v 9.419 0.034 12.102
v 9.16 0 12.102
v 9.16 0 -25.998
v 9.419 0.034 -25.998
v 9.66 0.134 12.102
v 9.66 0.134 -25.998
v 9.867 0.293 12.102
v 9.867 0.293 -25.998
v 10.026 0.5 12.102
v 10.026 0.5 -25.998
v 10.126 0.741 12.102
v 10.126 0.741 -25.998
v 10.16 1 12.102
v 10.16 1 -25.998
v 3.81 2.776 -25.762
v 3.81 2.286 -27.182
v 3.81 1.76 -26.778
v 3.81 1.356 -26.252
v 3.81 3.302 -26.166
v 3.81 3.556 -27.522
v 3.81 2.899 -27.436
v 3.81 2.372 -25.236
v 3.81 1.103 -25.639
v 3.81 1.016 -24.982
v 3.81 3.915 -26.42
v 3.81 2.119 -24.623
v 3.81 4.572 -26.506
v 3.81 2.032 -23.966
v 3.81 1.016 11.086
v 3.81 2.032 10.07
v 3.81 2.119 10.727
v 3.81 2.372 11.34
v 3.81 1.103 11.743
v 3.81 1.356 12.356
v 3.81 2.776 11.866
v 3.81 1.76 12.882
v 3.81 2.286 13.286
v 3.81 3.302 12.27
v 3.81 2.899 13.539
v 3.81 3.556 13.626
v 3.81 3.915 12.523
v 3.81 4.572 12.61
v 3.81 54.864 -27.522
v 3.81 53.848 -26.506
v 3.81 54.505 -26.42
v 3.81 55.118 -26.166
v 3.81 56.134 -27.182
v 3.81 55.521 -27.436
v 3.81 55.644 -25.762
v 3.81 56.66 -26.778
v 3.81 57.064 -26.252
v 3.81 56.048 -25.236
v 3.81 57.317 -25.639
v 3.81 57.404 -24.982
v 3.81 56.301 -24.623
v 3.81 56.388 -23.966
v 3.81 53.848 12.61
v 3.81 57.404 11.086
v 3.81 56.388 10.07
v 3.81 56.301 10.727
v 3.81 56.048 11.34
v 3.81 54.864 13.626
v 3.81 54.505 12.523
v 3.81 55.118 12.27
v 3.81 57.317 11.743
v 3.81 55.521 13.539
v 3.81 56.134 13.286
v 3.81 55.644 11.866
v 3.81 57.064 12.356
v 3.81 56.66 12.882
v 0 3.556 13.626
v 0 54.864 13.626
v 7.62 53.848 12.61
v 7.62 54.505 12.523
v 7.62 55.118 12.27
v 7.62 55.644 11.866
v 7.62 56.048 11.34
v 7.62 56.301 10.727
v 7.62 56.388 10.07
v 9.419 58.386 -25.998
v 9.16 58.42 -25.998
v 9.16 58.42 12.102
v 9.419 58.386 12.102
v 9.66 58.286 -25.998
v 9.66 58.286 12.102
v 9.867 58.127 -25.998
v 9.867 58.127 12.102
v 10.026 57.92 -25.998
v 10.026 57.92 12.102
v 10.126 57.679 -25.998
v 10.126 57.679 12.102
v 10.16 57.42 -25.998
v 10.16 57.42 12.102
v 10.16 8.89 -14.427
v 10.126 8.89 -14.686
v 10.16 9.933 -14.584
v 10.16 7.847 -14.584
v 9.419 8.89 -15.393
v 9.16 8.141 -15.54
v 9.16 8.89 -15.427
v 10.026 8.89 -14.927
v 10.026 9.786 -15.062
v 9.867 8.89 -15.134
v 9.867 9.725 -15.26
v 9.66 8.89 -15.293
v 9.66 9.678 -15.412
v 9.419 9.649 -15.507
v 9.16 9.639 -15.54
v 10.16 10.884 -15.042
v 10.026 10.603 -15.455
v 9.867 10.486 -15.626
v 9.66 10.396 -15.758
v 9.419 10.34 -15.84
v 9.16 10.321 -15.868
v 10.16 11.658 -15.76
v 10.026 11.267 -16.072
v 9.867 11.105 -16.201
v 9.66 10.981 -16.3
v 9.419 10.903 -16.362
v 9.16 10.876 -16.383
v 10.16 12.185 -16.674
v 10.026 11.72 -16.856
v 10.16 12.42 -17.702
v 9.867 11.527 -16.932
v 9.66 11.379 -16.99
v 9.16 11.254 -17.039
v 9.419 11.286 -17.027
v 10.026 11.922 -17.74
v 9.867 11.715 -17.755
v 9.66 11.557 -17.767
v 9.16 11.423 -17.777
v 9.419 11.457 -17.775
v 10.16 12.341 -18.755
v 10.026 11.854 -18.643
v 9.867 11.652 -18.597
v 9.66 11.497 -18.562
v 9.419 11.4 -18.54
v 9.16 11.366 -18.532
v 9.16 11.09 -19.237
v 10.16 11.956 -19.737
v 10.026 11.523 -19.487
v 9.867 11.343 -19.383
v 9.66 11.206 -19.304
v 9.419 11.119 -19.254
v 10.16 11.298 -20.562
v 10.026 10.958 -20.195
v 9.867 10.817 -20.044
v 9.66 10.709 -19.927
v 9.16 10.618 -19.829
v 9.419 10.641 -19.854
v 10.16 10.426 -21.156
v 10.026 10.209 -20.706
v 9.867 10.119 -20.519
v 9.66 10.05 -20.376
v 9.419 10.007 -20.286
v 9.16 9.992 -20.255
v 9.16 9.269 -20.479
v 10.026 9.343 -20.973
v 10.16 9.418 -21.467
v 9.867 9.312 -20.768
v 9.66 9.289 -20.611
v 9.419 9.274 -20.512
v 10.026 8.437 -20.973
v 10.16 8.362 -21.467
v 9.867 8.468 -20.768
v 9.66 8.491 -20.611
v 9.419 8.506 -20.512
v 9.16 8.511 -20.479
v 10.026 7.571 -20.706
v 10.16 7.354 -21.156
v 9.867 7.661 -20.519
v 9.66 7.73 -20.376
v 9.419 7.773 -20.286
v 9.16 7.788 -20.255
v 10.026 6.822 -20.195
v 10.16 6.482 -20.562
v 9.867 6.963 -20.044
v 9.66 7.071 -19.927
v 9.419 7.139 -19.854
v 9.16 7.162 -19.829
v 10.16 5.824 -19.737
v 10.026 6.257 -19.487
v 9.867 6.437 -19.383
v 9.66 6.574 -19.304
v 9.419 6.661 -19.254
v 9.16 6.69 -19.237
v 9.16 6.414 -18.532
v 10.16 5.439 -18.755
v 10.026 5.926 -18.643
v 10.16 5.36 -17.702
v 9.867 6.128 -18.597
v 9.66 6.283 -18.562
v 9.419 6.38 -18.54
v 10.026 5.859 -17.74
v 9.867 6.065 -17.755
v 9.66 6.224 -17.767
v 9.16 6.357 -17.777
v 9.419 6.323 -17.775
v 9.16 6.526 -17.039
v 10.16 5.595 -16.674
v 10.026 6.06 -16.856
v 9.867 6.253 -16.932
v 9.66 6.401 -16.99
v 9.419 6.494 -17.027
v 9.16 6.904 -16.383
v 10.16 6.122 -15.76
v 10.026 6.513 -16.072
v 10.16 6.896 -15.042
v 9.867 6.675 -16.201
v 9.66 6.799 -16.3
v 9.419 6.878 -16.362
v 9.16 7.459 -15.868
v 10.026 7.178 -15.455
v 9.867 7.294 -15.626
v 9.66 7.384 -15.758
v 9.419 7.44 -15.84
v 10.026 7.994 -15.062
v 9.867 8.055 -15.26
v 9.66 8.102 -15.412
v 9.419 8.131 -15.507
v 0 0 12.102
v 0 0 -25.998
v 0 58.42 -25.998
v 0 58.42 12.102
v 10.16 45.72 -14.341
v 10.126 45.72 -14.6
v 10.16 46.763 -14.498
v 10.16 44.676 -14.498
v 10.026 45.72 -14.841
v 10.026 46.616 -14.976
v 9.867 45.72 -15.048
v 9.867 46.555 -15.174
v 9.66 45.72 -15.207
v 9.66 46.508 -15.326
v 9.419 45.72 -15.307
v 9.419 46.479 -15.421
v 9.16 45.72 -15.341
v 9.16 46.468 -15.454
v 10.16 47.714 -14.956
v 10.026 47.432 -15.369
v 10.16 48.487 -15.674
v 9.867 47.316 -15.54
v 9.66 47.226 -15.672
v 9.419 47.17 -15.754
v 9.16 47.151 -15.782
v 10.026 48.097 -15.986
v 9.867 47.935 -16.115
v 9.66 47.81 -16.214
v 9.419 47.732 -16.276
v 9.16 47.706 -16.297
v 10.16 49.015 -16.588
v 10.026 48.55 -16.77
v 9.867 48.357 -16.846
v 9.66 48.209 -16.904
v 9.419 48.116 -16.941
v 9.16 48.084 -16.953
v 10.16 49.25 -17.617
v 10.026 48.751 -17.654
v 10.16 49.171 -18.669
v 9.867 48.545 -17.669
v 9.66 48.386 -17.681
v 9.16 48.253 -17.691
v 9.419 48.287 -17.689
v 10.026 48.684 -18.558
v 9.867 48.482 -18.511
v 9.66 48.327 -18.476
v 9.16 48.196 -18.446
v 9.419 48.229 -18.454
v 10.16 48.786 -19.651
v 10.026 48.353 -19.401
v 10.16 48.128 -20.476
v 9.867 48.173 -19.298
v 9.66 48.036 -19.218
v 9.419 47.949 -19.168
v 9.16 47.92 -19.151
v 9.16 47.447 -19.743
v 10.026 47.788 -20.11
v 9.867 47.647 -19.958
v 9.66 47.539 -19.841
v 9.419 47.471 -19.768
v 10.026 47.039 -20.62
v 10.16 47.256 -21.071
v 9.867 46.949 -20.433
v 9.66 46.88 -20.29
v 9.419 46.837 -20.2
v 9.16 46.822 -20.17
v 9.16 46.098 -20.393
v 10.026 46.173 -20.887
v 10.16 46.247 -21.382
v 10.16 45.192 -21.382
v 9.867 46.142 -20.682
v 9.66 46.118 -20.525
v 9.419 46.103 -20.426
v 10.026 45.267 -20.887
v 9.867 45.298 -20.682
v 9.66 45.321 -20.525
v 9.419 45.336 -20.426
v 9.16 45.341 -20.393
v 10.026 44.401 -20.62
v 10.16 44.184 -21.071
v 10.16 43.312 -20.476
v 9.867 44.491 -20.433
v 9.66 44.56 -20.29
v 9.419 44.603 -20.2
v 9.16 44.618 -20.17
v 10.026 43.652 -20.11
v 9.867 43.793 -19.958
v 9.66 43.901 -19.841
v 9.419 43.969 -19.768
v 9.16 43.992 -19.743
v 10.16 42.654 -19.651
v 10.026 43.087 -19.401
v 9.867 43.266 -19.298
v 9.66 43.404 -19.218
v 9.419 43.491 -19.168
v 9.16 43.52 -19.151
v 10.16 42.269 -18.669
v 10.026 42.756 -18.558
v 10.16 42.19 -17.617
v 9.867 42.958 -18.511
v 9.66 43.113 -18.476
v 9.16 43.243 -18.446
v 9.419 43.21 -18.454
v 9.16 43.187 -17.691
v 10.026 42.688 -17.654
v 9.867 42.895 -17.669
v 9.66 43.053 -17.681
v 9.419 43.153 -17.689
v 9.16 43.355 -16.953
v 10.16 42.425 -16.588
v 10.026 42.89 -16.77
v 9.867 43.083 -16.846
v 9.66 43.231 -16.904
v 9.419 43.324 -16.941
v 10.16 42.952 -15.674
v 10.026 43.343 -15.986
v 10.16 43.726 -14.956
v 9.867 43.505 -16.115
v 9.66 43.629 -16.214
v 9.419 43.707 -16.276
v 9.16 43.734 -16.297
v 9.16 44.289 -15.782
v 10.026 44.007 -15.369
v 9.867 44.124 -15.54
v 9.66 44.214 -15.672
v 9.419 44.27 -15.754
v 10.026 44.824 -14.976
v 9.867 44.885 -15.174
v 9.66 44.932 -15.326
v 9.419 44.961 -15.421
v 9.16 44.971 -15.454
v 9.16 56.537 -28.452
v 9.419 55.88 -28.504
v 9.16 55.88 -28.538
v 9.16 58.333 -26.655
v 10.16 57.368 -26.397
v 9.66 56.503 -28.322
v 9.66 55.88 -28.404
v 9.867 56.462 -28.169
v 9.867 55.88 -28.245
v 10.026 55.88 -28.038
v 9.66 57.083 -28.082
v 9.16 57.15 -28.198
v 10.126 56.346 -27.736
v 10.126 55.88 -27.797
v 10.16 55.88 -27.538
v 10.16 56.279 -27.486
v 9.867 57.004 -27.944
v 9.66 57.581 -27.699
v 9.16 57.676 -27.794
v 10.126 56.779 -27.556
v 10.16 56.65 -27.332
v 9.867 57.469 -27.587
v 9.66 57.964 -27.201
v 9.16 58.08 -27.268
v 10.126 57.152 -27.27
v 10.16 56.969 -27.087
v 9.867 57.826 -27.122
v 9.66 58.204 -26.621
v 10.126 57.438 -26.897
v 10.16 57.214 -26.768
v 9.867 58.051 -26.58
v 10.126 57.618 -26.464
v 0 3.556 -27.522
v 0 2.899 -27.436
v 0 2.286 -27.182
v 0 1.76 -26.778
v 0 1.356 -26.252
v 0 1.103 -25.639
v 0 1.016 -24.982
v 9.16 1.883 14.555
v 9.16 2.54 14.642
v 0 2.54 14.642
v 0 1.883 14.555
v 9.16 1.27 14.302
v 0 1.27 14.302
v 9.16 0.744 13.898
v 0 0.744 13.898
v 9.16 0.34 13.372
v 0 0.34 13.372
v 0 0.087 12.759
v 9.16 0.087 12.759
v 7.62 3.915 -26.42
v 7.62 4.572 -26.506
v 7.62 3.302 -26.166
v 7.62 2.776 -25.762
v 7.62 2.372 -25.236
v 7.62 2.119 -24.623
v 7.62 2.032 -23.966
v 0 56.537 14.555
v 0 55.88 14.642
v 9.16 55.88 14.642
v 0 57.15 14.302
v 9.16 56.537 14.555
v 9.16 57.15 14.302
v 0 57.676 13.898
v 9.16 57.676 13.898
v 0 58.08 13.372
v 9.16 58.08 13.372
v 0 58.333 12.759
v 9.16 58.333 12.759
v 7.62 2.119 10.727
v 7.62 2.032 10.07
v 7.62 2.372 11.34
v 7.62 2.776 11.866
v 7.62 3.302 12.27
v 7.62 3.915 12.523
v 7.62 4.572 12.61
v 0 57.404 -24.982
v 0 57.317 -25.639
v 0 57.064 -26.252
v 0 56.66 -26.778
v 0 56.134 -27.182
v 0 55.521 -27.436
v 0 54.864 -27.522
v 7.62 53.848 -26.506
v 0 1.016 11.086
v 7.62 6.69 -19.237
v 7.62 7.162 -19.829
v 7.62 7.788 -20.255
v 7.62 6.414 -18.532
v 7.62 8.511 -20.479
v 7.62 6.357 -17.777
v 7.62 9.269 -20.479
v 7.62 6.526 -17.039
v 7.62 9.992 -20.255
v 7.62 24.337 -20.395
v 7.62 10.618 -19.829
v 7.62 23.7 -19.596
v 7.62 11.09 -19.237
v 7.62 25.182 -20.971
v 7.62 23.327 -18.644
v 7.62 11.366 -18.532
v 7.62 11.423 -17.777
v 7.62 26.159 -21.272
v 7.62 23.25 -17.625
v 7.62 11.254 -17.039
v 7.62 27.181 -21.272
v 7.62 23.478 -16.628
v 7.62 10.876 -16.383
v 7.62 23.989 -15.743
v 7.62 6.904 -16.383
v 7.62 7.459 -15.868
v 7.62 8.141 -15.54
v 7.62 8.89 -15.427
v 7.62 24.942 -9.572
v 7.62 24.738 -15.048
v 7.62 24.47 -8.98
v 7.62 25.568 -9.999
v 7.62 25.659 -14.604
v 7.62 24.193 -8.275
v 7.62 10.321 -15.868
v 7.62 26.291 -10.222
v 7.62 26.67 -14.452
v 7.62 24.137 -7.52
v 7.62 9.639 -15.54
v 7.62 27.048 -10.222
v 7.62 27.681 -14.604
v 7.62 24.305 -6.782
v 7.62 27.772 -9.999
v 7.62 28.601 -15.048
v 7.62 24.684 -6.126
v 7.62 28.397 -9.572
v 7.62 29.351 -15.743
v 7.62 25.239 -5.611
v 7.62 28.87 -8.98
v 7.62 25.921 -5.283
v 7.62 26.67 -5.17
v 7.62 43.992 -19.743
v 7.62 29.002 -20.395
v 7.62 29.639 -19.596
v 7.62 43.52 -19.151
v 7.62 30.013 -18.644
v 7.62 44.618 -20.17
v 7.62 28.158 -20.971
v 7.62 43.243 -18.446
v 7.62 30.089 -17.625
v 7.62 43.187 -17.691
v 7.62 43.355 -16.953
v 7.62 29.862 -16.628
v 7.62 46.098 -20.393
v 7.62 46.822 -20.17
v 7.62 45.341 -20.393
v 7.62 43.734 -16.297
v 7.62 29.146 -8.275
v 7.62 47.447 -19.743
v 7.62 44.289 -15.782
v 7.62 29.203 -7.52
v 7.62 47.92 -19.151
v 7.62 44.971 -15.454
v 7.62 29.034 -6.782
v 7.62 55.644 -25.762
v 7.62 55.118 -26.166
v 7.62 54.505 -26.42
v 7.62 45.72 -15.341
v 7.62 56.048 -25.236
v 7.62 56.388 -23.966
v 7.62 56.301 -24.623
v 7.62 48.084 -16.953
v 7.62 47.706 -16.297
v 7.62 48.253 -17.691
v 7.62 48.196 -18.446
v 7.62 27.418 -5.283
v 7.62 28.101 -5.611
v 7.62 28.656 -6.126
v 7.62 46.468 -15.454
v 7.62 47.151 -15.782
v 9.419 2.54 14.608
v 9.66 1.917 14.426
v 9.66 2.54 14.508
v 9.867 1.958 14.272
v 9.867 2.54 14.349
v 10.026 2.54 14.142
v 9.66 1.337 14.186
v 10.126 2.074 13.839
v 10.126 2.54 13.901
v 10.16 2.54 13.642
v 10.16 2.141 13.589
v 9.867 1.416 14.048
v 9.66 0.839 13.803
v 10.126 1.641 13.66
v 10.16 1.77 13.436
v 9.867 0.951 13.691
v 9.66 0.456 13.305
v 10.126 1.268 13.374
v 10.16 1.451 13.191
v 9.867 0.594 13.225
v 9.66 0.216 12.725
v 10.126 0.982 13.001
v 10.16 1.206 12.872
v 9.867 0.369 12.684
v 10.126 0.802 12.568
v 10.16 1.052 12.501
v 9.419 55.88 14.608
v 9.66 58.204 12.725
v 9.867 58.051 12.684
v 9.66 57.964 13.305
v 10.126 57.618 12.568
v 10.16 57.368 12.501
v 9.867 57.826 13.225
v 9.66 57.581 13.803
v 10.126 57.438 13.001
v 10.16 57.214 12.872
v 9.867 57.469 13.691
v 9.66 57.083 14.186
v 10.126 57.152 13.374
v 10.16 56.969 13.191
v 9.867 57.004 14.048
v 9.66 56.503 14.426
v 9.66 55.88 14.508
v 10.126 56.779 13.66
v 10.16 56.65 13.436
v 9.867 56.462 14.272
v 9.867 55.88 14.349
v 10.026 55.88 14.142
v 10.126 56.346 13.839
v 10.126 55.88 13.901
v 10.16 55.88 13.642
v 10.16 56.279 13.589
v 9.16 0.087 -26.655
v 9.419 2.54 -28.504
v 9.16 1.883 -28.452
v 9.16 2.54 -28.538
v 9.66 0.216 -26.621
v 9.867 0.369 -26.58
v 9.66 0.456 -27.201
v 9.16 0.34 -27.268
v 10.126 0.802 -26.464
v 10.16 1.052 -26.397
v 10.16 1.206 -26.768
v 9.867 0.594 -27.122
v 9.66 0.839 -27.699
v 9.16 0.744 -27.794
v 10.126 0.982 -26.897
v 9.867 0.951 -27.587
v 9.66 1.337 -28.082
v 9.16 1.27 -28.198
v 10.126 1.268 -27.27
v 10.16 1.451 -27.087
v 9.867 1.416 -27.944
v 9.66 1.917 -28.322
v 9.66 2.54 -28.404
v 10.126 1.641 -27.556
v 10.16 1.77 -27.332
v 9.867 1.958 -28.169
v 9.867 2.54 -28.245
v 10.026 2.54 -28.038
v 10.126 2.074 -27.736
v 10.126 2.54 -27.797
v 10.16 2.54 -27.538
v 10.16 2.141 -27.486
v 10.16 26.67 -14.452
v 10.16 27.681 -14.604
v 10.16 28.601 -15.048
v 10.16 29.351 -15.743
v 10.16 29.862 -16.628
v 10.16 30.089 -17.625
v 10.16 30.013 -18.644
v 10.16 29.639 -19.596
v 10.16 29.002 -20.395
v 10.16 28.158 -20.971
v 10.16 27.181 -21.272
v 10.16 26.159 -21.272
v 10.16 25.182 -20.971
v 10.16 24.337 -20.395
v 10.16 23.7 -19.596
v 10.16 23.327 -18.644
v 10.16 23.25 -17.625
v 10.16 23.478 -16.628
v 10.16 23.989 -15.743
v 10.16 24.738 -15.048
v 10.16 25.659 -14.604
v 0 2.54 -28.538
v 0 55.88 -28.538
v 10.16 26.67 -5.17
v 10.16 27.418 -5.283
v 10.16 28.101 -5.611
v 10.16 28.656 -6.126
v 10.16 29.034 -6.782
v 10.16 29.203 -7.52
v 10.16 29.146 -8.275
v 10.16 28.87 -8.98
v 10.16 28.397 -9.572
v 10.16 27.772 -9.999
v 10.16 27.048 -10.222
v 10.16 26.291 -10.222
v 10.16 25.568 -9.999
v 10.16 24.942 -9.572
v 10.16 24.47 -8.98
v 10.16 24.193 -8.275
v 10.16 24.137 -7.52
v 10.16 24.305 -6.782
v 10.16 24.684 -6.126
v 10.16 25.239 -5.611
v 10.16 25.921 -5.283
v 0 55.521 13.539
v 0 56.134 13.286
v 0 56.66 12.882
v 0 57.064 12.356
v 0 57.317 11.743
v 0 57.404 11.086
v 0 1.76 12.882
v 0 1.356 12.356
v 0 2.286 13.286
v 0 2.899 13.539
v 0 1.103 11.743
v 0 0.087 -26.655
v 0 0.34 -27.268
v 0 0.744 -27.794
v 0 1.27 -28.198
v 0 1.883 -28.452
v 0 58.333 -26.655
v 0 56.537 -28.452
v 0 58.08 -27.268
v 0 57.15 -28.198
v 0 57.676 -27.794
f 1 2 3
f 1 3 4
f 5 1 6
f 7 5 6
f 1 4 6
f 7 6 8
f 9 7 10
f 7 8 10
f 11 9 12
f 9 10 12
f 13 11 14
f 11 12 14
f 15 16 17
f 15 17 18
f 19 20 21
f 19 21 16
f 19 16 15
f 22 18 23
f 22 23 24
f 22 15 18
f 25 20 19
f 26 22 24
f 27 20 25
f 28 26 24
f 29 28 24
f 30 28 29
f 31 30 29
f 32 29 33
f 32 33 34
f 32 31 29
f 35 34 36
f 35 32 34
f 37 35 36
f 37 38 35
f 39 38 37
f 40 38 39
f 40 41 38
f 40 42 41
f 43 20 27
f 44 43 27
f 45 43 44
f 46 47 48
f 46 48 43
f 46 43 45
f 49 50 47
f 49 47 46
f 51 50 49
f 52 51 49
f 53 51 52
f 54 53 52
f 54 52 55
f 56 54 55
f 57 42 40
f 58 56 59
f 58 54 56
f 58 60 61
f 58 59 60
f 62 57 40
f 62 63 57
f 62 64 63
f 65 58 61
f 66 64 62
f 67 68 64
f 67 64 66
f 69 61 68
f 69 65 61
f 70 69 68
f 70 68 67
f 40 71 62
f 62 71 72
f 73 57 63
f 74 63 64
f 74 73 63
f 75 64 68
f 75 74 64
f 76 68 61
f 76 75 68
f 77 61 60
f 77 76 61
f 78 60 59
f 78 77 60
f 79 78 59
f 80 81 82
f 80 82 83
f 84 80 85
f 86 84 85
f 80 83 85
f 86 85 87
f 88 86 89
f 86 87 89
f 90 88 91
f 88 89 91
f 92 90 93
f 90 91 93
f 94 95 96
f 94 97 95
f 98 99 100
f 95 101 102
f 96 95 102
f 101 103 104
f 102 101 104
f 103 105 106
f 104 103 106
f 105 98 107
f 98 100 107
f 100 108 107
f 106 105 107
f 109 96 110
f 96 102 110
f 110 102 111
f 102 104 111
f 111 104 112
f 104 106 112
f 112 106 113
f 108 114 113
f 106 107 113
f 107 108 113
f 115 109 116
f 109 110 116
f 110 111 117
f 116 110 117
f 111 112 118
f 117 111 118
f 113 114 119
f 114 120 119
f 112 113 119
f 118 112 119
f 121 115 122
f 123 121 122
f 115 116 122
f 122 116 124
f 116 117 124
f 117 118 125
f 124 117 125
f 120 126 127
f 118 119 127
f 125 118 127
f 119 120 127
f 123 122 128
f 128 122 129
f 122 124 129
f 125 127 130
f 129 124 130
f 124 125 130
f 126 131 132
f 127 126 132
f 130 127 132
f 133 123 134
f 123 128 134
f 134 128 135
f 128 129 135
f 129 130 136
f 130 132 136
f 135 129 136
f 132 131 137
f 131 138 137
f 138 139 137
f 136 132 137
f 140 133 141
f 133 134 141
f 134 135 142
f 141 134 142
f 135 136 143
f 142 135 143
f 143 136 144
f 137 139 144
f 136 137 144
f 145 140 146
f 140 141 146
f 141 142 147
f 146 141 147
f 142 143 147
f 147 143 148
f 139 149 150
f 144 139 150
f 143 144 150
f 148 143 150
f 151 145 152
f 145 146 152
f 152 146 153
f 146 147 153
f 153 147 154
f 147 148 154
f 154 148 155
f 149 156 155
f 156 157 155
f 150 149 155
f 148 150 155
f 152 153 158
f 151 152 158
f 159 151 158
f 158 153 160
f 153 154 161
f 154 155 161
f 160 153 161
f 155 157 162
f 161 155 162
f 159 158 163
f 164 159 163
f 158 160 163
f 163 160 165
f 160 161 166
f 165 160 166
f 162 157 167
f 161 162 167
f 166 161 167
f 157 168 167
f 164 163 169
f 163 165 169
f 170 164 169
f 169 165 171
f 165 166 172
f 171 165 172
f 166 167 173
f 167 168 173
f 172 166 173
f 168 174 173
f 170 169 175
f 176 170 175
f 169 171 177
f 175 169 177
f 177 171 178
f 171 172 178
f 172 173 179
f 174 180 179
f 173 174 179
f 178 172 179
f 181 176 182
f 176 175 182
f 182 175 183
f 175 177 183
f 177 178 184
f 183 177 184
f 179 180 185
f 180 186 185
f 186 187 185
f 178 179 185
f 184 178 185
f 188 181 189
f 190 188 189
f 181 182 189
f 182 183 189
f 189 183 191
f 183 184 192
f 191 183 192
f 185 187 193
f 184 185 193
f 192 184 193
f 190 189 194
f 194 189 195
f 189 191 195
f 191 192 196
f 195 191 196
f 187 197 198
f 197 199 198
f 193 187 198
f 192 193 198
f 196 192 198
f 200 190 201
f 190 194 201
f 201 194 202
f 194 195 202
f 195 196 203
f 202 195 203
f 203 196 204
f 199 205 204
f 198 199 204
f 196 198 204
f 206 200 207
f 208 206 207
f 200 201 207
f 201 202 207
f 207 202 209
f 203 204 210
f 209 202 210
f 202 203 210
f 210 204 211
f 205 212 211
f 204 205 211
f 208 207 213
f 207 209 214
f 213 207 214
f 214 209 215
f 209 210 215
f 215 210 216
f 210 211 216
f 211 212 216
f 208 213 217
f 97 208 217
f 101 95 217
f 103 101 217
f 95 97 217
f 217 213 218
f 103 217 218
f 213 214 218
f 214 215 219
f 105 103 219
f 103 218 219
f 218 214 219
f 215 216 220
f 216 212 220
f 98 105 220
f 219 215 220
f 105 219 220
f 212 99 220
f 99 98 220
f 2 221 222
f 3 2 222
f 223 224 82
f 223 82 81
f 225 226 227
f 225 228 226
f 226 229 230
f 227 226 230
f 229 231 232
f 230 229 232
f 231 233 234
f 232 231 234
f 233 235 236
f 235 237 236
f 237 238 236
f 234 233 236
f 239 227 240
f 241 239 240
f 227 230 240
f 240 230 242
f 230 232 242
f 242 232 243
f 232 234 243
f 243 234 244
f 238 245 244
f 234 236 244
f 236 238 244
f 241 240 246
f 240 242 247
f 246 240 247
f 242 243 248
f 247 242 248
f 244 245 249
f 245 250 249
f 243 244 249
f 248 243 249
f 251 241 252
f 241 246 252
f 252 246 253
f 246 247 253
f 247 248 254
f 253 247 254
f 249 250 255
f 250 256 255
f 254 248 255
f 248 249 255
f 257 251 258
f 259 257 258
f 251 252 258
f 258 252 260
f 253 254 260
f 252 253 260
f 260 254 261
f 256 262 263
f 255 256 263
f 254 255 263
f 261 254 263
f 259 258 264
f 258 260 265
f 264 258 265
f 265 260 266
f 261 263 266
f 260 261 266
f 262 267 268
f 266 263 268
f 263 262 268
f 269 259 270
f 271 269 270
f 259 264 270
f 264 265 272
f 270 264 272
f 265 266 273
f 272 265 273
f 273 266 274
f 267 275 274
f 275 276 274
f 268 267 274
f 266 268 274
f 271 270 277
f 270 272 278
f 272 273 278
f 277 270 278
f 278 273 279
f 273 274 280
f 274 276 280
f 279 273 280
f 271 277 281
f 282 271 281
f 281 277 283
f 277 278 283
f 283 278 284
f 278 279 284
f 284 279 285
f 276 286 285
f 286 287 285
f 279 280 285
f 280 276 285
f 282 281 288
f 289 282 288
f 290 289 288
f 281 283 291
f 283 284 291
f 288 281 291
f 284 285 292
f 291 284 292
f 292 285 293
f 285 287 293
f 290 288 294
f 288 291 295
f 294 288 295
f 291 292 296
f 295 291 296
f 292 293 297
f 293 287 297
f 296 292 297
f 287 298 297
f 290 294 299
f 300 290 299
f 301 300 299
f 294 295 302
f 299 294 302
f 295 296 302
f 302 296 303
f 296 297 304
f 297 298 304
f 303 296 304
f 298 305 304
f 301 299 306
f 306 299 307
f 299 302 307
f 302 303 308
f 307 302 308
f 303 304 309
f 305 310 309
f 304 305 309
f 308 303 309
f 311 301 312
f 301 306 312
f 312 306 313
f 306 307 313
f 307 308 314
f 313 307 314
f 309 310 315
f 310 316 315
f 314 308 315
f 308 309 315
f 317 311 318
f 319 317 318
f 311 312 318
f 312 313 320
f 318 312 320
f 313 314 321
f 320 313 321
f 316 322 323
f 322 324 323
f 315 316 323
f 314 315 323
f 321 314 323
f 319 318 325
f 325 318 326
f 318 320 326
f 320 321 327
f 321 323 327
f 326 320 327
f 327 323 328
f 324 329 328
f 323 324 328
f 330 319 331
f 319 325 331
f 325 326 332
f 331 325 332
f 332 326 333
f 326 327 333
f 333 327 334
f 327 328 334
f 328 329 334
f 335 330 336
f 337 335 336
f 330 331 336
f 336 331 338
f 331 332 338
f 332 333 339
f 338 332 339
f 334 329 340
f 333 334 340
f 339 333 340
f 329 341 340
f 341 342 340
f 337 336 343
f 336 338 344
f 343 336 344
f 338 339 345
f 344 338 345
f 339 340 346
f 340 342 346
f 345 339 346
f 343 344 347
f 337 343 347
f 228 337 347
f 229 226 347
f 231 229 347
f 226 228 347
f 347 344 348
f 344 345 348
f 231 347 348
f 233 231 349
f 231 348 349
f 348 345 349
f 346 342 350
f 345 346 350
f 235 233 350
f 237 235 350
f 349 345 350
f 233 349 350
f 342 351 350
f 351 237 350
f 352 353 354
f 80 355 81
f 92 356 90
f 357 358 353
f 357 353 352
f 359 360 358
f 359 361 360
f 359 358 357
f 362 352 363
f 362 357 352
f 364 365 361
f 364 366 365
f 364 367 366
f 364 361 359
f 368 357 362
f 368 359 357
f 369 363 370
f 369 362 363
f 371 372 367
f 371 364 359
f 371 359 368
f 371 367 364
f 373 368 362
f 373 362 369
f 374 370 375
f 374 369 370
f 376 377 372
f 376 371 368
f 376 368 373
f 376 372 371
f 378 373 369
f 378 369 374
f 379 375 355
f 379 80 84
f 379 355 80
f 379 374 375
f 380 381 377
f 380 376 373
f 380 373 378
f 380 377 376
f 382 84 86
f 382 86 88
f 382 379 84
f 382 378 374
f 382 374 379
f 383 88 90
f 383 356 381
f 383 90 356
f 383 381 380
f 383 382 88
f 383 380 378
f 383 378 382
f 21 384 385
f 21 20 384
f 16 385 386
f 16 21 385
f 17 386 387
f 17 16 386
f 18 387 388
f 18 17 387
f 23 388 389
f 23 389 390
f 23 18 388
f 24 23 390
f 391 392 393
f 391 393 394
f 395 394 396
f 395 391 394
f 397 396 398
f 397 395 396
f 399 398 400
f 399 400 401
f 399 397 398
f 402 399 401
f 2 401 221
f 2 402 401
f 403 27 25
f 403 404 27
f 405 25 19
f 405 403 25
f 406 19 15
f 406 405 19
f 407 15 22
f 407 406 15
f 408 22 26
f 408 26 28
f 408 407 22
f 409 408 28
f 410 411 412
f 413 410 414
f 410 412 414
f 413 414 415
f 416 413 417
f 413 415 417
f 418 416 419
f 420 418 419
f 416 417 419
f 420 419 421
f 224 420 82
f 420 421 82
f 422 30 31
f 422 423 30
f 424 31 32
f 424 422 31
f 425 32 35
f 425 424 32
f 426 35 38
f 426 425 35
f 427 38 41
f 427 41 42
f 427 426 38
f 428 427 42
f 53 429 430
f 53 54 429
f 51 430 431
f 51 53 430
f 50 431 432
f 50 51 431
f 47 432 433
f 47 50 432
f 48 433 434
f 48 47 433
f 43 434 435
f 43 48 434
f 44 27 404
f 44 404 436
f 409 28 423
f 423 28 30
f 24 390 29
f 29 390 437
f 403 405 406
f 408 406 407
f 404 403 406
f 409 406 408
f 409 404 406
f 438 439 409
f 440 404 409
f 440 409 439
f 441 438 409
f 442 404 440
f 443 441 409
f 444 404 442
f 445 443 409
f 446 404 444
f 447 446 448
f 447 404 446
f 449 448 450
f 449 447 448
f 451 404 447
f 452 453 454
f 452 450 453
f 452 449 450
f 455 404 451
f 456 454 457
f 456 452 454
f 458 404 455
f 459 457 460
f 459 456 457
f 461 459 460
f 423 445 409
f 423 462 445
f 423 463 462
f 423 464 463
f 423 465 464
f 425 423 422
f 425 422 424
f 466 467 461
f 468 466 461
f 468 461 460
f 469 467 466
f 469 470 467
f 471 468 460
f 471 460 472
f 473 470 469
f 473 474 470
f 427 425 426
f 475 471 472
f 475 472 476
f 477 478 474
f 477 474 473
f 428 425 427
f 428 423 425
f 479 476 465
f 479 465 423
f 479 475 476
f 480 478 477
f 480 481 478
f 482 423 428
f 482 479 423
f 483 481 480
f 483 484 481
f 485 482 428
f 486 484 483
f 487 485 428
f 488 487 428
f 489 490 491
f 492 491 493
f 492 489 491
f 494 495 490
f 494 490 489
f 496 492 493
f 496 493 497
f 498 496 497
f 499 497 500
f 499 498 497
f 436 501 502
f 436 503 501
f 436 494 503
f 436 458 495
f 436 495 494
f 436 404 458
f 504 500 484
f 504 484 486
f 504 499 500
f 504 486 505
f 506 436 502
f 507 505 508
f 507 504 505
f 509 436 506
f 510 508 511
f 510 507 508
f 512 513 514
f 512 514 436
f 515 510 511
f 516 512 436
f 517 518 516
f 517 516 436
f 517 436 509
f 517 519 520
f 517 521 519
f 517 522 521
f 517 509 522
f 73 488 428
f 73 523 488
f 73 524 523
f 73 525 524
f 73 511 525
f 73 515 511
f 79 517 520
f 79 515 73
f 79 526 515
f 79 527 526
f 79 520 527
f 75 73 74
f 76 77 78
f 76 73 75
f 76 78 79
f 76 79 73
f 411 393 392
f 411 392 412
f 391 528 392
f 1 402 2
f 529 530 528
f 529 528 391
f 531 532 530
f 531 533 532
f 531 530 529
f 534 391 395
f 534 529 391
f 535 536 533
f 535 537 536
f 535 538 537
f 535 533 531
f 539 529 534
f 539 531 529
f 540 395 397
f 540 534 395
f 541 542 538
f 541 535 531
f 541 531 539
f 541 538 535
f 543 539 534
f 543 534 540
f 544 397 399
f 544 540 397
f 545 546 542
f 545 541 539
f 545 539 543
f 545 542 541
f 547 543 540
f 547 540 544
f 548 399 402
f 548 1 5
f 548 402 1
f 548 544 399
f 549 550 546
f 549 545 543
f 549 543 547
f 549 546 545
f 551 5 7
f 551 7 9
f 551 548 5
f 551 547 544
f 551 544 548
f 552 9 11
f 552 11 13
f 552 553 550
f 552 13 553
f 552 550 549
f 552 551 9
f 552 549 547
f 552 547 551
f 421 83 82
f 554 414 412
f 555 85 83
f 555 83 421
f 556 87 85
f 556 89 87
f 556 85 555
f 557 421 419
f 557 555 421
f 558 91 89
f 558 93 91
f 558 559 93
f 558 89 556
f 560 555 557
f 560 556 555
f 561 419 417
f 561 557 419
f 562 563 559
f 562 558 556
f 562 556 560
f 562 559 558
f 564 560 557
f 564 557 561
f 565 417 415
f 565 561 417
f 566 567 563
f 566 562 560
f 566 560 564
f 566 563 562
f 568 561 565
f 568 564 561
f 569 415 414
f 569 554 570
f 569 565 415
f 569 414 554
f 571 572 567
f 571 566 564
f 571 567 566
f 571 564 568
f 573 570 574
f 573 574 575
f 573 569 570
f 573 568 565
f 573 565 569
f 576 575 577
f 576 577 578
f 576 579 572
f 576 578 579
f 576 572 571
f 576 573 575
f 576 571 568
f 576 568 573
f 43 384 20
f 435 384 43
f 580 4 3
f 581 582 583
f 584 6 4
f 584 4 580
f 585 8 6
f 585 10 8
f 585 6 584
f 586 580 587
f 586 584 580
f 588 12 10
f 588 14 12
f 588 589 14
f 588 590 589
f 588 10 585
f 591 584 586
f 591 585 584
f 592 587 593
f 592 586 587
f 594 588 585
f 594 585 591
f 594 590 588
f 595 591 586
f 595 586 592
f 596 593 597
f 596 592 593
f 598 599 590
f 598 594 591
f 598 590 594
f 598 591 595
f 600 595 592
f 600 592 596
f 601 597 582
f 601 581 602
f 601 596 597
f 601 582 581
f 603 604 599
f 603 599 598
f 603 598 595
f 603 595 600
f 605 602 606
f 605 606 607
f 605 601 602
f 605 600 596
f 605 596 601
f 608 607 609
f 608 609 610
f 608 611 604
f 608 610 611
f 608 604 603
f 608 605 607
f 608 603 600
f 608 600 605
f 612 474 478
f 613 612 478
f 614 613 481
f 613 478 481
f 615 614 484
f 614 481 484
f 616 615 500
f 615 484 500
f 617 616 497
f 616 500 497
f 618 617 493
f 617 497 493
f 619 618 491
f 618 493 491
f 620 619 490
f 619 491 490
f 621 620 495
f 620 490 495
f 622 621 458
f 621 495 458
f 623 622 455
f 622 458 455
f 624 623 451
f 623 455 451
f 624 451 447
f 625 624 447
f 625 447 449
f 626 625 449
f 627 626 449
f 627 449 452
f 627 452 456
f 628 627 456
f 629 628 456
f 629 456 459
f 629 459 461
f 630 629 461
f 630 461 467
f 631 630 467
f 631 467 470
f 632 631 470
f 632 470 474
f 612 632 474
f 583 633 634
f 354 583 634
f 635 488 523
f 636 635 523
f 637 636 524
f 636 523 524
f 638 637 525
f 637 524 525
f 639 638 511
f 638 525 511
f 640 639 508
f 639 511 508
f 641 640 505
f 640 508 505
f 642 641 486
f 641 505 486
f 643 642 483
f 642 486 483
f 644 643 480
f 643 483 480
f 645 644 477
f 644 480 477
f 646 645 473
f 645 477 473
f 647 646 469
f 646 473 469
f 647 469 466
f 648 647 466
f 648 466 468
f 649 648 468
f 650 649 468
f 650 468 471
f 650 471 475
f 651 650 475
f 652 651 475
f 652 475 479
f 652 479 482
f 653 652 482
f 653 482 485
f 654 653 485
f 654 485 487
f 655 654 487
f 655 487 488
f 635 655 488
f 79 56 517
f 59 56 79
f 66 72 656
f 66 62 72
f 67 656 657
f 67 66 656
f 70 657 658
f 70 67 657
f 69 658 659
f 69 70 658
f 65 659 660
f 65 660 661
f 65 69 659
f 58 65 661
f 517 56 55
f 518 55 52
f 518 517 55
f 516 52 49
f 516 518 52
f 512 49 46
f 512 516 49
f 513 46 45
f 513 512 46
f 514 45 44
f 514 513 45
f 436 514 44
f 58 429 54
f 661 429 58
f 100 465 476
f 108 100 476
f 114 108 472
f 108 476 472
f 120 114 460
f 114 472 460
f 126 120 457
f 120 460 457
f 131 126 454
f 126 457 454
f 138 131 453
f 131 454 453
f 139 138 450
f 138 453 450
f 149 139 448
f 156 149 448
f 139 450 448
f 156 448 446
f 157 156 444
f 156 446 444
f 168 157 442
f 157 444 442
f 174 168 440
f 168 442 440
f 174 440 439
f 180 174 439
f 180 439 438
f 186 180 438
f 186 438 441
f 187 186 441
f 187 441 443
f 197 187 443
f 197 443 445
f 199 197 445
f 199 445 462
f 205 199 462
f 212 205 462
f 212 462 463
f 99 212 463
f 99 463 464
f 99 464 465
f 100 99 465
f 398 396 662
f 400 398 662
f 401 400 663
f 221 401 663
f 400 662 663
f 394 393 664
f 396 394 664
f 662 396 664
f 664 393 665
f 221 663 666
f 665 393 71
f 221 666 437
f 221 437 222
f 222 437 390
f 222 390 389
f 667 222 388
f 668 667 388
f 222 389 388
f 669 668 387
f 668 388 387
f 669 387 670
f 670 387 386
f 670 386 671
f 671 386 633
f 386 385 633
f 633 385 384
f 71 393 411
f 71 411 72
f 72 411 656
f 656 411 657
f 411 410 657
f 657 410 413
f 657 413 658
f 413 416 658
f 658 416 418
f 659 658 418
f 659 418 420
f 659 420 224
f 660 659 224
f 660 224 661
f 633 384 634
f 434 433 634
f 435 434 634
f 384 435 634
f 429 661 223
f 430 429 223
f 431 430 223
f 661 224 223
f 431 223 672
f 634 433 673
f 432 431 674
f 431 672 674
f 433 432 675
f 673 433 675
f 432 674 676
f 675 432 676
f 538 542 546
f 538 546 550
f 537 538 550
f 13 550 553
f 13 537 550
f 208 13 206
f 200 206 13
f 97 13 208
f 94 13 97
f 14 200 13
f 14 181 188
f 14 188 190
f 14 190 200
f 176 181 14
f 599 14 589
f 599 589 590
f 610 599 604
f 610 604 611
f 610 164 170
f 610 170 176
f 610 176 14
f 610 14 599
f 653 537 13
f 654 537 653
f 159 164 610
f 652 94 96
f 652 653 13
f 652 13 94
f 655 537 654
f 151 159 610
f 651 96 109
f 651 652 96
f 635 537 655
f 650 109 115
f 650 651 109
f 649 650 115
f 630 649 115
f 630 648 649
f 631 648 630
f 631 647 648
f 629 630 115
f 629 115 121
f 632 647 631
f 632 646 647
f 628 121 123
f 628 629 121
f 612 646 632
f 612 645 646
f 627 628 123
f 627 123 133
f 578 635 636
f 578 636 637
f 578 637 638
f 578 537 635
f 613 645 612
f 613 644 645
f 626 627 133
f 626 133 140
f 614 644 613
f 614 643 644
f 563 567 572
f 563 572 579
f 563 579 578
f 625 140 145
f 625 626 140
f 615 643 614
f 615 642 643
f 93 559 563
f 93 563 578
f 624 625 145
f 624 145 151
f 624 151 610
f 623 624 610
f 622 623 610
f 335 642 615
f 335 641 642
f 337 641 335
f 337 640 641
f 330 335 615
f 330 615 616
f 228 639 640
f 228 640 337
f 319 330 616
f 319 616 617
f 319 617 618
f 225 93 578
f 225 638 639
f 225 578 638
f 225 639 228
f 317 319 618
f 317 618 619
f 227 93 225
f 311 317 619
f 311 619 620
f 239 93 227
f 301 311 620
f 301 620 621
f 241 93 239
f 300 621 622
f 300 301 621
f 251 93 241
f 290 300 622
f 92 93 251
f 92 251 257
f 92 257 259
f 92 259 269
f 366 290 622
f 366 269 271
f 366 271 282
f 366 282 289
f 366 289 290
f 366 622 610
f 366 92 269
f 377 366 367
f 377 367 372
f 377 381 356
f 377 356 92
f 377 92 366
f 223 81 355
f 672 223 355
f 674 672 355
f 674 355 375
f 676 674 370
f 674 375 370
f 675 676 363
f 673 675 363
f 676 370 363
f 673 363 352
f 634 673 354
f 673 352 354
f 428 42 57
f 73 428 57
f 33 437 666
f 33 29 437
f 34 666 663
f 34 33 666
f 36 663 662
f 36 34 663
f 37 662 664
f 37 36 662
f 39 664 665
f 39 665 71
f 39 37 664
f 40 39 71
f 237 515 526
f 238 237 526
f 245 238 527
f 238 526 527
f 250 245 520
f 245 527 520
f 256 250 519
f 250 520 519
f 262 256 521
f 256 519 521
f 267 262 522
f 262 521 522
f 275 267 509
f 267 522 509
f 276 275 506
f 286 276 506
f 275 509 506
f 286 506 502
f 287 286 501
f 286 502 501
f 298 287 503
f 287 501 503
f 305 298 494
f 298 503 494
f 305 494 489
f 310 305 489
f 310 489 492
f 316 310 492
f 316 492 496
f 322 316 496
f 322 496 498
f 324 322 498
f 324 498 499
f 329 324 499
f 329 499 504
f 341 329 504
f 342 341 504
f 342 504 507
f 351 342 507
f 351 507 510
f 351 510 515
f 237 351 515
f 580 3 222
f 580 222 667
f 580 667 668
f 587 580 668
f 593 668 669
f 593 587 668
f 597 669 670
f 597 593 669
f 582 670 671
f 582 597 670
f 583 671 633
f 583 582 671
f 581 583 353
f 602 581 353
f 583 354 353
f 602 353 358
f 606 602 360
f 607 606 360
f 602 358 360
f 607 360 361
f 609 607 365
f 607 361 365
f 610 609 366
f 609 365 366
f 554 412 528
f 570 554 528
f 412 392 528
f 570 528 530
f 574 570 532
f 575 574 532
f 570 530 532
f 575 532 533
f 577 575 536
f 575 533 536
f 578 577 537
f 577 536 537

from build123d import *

# Parameters (mm, degrees)
SKETCH1_W           = 43.18
SKETCH1_H           = 58.42
BOSS_EXTRUDE1_DEPTH = 10.16
SKETCH2_R           = 2.54
SKETCH2_R_2         = 3.429
CUT_EXTRUDE2_DEPTH  = 11.16
SKETCH3_W           = 39.116
SKETCH3_H           = 54.356
CUT_EXTRUDE3_DEPTH  = 7.62
SKETCH4_W           = 41.148
SKETCH4_H           = 56.388
CUT_EXTRUDE4_DEPTH  = 3.81
FILLET1_R           = 2.54
FILLET2_R           = 2.54
FILLET3_R           = 2.54
FILLET4_R           = 2.54
FILLET5_R           = 2.54
FILLET6_R           = 1
FILLET7_R           = 1
FILLET8_R           = 1


with BuildPart() as part:
    # Sketch1 → Boss-Extrude1 (new body)
    with BuildSketch(Plane(origin=(0, 0, 0), x_dir=(0, 0, -1), z_dir=(1, 0, 0))):
        with Locations((6.948060942, 29.21)):
            Rectangle(SKETCH1_W, SKETCH1_H)
    extrude(amount=BOSS_EXTRUDE1_DEPTH)

    # Sketch2 → Cut-Extrude2 (cut, through all)
    with BuildSketch(Plane.ZY):
        with Locations((-17.96692562, 8.890014802)):
            Circle(SKETCH2_R)
        with Locations((-17.881082197, 45.719807571)):
            Circle(SKETCH2_R)
        with Locations((-17.881082197, 26.669807571)):
            Circle(SKETCH2_R_2)
        with Locations((-7.710060942, 26.669807571)):
            Circle(SKETCH2_R)
    extrude(amount=-CUT_EXTRUDE2_DEPTH, mode=Mode.SUBTRACT)

    # Sketch3 → Cut-Extrude3 (cut)
    with BuildSketch(Plane.ZY):
        with Locations((-6.948060942, 29.21)):
            Rectangle(SKETCH3_W, SKETCH3_H)
    extrude(amount=-CUT_EXTRUDE3_DEPTH, mode=Mode.SUBTRACT)

    # Sketch4 → Cut-Extrude4 (cut)
    with BuildSketch(Plane.ZY):
        with Locations((-6.948060942, 29.21)):
            Rectangle(SKETCH4_W, SKETCH4_H)
    extrude(amount=-CUT_EXTRUDE4_DEPTH, mode=Mode.SUBTRACT)

    # Fillet1
    fillet1_edges = [part.edges().sort_by_distance(p)[0] for p in [
        (5.715, 2.032, -26.506060942),
        (1.905, 1.016, -27.522060942),
    ]]
    fillet(fillet1_edges, radius=FILLET1_R)

    # Fillet2
    fillet2_edges = [part.edges().sort_by_distance(p)[0] for p in [
        (5.715, 2.032, 12.609939058),
        (1.905, 1.016, 13.625939058),
    ]]
    fillet(fillet2_edges, radius=FILLET2_R)

    # Fillet3
    fillet3_edges = [part.edges().sort_by_distance(p)[0] for p in [
        (5.715, 56.388, 12.609939058),
        (1.905, 57.404, 13.625939058),
    ]]
    fillet(fillet3_edges, radius=FILLET3_R)

    # Fillet4
    fillet4_edges = [part.edges().sort_by_distance(p)[0] for p in [
        (5.715, 56.388, -26.506060942),
        (1.905, 57.404, -27.522060942),
    ]]
    fillet(fillet4_edges, radius=FILLET4_R)

    # Fillet5
    fillet5_edges = [part.edges().sort_by_distance(p)[0] for p in [
        (5.08, 58.42, 14.641939058),
        (5.08, 58.42, -28.538060942),
        (5.08, 0, -28.538060942),
        (5.08, 0, 14.641939058),
    ]]
    fillet(fillet5_edges, radius=FILLET5_R)

    # Fillet6
    fillet6_edges = [part.edges().sort_by_distance(p)[0] for p in [
        (10.16, 29.21, -28.538060942),
        (10.16, 0, -6.948060942),
        (10.16, 29.21, 14.641939058),
        (10.16, 58.42, -6.948060942),
        (10.16, 57.676051224, 13.897990282),
        (10.16, 57.676051224, -27.794112166),
        (10.16, 0.743948776, 13.897990282),
        (10.16, 0.743948776, -27.794112166),
    ]]
    fillet(fillet6_edges, radius=FILLET6_R)

    # Fillet7
    fillet7_edges = [part.edges().sort_by_distance(p)[0] for p in [
        (10.16, 45.719807571, -20.421082197),
    ]]
    fillet(fillet7_edges, radius=FILLET7_R)

    # Fillet8
    fillet8_edges = [part.edges().sort_by_distance(p)[0] for p in [
        (10.16, 8.890014802, -20.50692562),
    ]]
    fillet(fillet8_edges, radius=FILLET8_R)


solid = part.part
